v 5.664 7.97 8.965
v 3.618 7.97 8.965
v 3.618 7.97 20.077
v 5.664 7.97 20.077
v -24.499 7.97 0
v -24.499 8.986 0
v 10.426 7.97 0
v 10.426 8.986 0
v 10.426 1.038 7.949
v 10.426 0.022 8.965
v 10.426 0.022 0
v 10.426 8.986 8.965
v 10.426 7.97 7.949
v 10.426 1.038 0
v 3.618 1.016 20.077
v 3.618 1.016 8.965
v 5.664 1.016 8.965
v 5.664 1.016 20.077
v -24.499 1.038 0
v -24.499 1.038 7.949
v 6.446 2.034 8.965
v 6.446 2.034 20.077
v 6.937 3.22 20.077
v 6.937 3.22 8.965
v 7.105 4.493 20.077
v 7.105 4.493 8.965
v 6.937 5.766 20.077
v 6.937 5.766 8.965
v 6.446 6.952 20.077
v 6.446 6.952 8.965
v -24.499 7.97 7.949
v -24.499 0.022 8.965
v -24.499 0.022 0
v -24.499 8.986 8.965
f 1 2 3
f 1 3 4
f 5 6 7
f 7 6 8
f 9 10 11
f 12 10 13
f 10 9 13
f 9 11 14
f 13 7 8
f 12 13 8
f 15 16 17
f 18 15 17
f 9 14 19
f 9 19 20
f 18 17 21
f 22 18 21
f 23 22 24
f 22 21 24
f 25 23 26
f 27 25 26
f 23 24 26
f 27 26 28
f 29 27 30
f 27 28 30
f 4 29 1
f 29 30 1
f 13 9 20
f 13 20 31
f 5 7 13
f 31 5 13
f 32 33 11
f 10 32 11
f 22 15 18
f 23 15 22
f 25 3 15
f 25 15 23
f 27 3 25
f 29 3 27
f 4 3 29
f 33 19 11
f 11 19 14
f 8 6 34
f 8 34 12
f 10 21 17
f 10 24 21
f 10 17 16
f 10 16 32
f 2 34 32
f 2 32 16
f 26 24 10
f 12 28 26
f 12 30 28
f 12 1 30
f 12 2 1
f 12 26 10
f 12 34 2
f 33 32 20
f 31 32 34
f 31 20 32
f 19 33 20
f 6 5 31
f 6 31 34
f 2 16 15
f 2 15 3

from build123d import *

# Parameters (mm, degrees)
F0_W     = 34.925
F0_H     = 8.9647058824
F1_DEPTH = 8.9647058824
F2_W     = 6.9327058824
F2_H     = 7.9487058824
F3_DEPTH = 34.926
F4_W     = 2.0463057544
F4_H     = 6.9543164351
F5_DEPTH = 11.1125


# Not quite as in the source:
# - a length typed as a fraction of an inch, garbled in the dataset ("3 / 203.2 mm" for 3/8 in), is restored


with BuildPart() as f1:
    # F0 (on Top) → F1 (new body)
    with BuildSketch(Plane.XY):
        with Locations((-7.0361781826, 4.5039634939)):
            Rectangle(F0_W, F0_H)
    extrude(amount=F1_DEPTH)

    # F2 (on face) → F3 (cut, through all)
    with BuildSketch(Plane.YZ.offset(10.4263218174)):
        with Locations((4.5039634939, 3.9743529412)):
            Rectangle(F2_W, F2_H)
    extrude(amount=-F3_DEPTH, mode=Mode.SUBTRACT)

    # F4 (on face) → F5 (join)
    with BuildSketch(Plane.XY.offset(8.9647058824)):
        with BuildLine():
            ThreePointArc((5.6638218174, 1.016), (7.1045145349, 4.4931582176), (5.6638218174, 7.9703164351))
            Line((5.6638218174, 7.9703164351), (5.6638218174, 1.016))
        make_face()
        with Locations((4.6406689402, 4.4931582176)):
            Rectangle(F4_W, F4_H)
    extrude(amount=F5_DEPTH)


solid = f1.part
